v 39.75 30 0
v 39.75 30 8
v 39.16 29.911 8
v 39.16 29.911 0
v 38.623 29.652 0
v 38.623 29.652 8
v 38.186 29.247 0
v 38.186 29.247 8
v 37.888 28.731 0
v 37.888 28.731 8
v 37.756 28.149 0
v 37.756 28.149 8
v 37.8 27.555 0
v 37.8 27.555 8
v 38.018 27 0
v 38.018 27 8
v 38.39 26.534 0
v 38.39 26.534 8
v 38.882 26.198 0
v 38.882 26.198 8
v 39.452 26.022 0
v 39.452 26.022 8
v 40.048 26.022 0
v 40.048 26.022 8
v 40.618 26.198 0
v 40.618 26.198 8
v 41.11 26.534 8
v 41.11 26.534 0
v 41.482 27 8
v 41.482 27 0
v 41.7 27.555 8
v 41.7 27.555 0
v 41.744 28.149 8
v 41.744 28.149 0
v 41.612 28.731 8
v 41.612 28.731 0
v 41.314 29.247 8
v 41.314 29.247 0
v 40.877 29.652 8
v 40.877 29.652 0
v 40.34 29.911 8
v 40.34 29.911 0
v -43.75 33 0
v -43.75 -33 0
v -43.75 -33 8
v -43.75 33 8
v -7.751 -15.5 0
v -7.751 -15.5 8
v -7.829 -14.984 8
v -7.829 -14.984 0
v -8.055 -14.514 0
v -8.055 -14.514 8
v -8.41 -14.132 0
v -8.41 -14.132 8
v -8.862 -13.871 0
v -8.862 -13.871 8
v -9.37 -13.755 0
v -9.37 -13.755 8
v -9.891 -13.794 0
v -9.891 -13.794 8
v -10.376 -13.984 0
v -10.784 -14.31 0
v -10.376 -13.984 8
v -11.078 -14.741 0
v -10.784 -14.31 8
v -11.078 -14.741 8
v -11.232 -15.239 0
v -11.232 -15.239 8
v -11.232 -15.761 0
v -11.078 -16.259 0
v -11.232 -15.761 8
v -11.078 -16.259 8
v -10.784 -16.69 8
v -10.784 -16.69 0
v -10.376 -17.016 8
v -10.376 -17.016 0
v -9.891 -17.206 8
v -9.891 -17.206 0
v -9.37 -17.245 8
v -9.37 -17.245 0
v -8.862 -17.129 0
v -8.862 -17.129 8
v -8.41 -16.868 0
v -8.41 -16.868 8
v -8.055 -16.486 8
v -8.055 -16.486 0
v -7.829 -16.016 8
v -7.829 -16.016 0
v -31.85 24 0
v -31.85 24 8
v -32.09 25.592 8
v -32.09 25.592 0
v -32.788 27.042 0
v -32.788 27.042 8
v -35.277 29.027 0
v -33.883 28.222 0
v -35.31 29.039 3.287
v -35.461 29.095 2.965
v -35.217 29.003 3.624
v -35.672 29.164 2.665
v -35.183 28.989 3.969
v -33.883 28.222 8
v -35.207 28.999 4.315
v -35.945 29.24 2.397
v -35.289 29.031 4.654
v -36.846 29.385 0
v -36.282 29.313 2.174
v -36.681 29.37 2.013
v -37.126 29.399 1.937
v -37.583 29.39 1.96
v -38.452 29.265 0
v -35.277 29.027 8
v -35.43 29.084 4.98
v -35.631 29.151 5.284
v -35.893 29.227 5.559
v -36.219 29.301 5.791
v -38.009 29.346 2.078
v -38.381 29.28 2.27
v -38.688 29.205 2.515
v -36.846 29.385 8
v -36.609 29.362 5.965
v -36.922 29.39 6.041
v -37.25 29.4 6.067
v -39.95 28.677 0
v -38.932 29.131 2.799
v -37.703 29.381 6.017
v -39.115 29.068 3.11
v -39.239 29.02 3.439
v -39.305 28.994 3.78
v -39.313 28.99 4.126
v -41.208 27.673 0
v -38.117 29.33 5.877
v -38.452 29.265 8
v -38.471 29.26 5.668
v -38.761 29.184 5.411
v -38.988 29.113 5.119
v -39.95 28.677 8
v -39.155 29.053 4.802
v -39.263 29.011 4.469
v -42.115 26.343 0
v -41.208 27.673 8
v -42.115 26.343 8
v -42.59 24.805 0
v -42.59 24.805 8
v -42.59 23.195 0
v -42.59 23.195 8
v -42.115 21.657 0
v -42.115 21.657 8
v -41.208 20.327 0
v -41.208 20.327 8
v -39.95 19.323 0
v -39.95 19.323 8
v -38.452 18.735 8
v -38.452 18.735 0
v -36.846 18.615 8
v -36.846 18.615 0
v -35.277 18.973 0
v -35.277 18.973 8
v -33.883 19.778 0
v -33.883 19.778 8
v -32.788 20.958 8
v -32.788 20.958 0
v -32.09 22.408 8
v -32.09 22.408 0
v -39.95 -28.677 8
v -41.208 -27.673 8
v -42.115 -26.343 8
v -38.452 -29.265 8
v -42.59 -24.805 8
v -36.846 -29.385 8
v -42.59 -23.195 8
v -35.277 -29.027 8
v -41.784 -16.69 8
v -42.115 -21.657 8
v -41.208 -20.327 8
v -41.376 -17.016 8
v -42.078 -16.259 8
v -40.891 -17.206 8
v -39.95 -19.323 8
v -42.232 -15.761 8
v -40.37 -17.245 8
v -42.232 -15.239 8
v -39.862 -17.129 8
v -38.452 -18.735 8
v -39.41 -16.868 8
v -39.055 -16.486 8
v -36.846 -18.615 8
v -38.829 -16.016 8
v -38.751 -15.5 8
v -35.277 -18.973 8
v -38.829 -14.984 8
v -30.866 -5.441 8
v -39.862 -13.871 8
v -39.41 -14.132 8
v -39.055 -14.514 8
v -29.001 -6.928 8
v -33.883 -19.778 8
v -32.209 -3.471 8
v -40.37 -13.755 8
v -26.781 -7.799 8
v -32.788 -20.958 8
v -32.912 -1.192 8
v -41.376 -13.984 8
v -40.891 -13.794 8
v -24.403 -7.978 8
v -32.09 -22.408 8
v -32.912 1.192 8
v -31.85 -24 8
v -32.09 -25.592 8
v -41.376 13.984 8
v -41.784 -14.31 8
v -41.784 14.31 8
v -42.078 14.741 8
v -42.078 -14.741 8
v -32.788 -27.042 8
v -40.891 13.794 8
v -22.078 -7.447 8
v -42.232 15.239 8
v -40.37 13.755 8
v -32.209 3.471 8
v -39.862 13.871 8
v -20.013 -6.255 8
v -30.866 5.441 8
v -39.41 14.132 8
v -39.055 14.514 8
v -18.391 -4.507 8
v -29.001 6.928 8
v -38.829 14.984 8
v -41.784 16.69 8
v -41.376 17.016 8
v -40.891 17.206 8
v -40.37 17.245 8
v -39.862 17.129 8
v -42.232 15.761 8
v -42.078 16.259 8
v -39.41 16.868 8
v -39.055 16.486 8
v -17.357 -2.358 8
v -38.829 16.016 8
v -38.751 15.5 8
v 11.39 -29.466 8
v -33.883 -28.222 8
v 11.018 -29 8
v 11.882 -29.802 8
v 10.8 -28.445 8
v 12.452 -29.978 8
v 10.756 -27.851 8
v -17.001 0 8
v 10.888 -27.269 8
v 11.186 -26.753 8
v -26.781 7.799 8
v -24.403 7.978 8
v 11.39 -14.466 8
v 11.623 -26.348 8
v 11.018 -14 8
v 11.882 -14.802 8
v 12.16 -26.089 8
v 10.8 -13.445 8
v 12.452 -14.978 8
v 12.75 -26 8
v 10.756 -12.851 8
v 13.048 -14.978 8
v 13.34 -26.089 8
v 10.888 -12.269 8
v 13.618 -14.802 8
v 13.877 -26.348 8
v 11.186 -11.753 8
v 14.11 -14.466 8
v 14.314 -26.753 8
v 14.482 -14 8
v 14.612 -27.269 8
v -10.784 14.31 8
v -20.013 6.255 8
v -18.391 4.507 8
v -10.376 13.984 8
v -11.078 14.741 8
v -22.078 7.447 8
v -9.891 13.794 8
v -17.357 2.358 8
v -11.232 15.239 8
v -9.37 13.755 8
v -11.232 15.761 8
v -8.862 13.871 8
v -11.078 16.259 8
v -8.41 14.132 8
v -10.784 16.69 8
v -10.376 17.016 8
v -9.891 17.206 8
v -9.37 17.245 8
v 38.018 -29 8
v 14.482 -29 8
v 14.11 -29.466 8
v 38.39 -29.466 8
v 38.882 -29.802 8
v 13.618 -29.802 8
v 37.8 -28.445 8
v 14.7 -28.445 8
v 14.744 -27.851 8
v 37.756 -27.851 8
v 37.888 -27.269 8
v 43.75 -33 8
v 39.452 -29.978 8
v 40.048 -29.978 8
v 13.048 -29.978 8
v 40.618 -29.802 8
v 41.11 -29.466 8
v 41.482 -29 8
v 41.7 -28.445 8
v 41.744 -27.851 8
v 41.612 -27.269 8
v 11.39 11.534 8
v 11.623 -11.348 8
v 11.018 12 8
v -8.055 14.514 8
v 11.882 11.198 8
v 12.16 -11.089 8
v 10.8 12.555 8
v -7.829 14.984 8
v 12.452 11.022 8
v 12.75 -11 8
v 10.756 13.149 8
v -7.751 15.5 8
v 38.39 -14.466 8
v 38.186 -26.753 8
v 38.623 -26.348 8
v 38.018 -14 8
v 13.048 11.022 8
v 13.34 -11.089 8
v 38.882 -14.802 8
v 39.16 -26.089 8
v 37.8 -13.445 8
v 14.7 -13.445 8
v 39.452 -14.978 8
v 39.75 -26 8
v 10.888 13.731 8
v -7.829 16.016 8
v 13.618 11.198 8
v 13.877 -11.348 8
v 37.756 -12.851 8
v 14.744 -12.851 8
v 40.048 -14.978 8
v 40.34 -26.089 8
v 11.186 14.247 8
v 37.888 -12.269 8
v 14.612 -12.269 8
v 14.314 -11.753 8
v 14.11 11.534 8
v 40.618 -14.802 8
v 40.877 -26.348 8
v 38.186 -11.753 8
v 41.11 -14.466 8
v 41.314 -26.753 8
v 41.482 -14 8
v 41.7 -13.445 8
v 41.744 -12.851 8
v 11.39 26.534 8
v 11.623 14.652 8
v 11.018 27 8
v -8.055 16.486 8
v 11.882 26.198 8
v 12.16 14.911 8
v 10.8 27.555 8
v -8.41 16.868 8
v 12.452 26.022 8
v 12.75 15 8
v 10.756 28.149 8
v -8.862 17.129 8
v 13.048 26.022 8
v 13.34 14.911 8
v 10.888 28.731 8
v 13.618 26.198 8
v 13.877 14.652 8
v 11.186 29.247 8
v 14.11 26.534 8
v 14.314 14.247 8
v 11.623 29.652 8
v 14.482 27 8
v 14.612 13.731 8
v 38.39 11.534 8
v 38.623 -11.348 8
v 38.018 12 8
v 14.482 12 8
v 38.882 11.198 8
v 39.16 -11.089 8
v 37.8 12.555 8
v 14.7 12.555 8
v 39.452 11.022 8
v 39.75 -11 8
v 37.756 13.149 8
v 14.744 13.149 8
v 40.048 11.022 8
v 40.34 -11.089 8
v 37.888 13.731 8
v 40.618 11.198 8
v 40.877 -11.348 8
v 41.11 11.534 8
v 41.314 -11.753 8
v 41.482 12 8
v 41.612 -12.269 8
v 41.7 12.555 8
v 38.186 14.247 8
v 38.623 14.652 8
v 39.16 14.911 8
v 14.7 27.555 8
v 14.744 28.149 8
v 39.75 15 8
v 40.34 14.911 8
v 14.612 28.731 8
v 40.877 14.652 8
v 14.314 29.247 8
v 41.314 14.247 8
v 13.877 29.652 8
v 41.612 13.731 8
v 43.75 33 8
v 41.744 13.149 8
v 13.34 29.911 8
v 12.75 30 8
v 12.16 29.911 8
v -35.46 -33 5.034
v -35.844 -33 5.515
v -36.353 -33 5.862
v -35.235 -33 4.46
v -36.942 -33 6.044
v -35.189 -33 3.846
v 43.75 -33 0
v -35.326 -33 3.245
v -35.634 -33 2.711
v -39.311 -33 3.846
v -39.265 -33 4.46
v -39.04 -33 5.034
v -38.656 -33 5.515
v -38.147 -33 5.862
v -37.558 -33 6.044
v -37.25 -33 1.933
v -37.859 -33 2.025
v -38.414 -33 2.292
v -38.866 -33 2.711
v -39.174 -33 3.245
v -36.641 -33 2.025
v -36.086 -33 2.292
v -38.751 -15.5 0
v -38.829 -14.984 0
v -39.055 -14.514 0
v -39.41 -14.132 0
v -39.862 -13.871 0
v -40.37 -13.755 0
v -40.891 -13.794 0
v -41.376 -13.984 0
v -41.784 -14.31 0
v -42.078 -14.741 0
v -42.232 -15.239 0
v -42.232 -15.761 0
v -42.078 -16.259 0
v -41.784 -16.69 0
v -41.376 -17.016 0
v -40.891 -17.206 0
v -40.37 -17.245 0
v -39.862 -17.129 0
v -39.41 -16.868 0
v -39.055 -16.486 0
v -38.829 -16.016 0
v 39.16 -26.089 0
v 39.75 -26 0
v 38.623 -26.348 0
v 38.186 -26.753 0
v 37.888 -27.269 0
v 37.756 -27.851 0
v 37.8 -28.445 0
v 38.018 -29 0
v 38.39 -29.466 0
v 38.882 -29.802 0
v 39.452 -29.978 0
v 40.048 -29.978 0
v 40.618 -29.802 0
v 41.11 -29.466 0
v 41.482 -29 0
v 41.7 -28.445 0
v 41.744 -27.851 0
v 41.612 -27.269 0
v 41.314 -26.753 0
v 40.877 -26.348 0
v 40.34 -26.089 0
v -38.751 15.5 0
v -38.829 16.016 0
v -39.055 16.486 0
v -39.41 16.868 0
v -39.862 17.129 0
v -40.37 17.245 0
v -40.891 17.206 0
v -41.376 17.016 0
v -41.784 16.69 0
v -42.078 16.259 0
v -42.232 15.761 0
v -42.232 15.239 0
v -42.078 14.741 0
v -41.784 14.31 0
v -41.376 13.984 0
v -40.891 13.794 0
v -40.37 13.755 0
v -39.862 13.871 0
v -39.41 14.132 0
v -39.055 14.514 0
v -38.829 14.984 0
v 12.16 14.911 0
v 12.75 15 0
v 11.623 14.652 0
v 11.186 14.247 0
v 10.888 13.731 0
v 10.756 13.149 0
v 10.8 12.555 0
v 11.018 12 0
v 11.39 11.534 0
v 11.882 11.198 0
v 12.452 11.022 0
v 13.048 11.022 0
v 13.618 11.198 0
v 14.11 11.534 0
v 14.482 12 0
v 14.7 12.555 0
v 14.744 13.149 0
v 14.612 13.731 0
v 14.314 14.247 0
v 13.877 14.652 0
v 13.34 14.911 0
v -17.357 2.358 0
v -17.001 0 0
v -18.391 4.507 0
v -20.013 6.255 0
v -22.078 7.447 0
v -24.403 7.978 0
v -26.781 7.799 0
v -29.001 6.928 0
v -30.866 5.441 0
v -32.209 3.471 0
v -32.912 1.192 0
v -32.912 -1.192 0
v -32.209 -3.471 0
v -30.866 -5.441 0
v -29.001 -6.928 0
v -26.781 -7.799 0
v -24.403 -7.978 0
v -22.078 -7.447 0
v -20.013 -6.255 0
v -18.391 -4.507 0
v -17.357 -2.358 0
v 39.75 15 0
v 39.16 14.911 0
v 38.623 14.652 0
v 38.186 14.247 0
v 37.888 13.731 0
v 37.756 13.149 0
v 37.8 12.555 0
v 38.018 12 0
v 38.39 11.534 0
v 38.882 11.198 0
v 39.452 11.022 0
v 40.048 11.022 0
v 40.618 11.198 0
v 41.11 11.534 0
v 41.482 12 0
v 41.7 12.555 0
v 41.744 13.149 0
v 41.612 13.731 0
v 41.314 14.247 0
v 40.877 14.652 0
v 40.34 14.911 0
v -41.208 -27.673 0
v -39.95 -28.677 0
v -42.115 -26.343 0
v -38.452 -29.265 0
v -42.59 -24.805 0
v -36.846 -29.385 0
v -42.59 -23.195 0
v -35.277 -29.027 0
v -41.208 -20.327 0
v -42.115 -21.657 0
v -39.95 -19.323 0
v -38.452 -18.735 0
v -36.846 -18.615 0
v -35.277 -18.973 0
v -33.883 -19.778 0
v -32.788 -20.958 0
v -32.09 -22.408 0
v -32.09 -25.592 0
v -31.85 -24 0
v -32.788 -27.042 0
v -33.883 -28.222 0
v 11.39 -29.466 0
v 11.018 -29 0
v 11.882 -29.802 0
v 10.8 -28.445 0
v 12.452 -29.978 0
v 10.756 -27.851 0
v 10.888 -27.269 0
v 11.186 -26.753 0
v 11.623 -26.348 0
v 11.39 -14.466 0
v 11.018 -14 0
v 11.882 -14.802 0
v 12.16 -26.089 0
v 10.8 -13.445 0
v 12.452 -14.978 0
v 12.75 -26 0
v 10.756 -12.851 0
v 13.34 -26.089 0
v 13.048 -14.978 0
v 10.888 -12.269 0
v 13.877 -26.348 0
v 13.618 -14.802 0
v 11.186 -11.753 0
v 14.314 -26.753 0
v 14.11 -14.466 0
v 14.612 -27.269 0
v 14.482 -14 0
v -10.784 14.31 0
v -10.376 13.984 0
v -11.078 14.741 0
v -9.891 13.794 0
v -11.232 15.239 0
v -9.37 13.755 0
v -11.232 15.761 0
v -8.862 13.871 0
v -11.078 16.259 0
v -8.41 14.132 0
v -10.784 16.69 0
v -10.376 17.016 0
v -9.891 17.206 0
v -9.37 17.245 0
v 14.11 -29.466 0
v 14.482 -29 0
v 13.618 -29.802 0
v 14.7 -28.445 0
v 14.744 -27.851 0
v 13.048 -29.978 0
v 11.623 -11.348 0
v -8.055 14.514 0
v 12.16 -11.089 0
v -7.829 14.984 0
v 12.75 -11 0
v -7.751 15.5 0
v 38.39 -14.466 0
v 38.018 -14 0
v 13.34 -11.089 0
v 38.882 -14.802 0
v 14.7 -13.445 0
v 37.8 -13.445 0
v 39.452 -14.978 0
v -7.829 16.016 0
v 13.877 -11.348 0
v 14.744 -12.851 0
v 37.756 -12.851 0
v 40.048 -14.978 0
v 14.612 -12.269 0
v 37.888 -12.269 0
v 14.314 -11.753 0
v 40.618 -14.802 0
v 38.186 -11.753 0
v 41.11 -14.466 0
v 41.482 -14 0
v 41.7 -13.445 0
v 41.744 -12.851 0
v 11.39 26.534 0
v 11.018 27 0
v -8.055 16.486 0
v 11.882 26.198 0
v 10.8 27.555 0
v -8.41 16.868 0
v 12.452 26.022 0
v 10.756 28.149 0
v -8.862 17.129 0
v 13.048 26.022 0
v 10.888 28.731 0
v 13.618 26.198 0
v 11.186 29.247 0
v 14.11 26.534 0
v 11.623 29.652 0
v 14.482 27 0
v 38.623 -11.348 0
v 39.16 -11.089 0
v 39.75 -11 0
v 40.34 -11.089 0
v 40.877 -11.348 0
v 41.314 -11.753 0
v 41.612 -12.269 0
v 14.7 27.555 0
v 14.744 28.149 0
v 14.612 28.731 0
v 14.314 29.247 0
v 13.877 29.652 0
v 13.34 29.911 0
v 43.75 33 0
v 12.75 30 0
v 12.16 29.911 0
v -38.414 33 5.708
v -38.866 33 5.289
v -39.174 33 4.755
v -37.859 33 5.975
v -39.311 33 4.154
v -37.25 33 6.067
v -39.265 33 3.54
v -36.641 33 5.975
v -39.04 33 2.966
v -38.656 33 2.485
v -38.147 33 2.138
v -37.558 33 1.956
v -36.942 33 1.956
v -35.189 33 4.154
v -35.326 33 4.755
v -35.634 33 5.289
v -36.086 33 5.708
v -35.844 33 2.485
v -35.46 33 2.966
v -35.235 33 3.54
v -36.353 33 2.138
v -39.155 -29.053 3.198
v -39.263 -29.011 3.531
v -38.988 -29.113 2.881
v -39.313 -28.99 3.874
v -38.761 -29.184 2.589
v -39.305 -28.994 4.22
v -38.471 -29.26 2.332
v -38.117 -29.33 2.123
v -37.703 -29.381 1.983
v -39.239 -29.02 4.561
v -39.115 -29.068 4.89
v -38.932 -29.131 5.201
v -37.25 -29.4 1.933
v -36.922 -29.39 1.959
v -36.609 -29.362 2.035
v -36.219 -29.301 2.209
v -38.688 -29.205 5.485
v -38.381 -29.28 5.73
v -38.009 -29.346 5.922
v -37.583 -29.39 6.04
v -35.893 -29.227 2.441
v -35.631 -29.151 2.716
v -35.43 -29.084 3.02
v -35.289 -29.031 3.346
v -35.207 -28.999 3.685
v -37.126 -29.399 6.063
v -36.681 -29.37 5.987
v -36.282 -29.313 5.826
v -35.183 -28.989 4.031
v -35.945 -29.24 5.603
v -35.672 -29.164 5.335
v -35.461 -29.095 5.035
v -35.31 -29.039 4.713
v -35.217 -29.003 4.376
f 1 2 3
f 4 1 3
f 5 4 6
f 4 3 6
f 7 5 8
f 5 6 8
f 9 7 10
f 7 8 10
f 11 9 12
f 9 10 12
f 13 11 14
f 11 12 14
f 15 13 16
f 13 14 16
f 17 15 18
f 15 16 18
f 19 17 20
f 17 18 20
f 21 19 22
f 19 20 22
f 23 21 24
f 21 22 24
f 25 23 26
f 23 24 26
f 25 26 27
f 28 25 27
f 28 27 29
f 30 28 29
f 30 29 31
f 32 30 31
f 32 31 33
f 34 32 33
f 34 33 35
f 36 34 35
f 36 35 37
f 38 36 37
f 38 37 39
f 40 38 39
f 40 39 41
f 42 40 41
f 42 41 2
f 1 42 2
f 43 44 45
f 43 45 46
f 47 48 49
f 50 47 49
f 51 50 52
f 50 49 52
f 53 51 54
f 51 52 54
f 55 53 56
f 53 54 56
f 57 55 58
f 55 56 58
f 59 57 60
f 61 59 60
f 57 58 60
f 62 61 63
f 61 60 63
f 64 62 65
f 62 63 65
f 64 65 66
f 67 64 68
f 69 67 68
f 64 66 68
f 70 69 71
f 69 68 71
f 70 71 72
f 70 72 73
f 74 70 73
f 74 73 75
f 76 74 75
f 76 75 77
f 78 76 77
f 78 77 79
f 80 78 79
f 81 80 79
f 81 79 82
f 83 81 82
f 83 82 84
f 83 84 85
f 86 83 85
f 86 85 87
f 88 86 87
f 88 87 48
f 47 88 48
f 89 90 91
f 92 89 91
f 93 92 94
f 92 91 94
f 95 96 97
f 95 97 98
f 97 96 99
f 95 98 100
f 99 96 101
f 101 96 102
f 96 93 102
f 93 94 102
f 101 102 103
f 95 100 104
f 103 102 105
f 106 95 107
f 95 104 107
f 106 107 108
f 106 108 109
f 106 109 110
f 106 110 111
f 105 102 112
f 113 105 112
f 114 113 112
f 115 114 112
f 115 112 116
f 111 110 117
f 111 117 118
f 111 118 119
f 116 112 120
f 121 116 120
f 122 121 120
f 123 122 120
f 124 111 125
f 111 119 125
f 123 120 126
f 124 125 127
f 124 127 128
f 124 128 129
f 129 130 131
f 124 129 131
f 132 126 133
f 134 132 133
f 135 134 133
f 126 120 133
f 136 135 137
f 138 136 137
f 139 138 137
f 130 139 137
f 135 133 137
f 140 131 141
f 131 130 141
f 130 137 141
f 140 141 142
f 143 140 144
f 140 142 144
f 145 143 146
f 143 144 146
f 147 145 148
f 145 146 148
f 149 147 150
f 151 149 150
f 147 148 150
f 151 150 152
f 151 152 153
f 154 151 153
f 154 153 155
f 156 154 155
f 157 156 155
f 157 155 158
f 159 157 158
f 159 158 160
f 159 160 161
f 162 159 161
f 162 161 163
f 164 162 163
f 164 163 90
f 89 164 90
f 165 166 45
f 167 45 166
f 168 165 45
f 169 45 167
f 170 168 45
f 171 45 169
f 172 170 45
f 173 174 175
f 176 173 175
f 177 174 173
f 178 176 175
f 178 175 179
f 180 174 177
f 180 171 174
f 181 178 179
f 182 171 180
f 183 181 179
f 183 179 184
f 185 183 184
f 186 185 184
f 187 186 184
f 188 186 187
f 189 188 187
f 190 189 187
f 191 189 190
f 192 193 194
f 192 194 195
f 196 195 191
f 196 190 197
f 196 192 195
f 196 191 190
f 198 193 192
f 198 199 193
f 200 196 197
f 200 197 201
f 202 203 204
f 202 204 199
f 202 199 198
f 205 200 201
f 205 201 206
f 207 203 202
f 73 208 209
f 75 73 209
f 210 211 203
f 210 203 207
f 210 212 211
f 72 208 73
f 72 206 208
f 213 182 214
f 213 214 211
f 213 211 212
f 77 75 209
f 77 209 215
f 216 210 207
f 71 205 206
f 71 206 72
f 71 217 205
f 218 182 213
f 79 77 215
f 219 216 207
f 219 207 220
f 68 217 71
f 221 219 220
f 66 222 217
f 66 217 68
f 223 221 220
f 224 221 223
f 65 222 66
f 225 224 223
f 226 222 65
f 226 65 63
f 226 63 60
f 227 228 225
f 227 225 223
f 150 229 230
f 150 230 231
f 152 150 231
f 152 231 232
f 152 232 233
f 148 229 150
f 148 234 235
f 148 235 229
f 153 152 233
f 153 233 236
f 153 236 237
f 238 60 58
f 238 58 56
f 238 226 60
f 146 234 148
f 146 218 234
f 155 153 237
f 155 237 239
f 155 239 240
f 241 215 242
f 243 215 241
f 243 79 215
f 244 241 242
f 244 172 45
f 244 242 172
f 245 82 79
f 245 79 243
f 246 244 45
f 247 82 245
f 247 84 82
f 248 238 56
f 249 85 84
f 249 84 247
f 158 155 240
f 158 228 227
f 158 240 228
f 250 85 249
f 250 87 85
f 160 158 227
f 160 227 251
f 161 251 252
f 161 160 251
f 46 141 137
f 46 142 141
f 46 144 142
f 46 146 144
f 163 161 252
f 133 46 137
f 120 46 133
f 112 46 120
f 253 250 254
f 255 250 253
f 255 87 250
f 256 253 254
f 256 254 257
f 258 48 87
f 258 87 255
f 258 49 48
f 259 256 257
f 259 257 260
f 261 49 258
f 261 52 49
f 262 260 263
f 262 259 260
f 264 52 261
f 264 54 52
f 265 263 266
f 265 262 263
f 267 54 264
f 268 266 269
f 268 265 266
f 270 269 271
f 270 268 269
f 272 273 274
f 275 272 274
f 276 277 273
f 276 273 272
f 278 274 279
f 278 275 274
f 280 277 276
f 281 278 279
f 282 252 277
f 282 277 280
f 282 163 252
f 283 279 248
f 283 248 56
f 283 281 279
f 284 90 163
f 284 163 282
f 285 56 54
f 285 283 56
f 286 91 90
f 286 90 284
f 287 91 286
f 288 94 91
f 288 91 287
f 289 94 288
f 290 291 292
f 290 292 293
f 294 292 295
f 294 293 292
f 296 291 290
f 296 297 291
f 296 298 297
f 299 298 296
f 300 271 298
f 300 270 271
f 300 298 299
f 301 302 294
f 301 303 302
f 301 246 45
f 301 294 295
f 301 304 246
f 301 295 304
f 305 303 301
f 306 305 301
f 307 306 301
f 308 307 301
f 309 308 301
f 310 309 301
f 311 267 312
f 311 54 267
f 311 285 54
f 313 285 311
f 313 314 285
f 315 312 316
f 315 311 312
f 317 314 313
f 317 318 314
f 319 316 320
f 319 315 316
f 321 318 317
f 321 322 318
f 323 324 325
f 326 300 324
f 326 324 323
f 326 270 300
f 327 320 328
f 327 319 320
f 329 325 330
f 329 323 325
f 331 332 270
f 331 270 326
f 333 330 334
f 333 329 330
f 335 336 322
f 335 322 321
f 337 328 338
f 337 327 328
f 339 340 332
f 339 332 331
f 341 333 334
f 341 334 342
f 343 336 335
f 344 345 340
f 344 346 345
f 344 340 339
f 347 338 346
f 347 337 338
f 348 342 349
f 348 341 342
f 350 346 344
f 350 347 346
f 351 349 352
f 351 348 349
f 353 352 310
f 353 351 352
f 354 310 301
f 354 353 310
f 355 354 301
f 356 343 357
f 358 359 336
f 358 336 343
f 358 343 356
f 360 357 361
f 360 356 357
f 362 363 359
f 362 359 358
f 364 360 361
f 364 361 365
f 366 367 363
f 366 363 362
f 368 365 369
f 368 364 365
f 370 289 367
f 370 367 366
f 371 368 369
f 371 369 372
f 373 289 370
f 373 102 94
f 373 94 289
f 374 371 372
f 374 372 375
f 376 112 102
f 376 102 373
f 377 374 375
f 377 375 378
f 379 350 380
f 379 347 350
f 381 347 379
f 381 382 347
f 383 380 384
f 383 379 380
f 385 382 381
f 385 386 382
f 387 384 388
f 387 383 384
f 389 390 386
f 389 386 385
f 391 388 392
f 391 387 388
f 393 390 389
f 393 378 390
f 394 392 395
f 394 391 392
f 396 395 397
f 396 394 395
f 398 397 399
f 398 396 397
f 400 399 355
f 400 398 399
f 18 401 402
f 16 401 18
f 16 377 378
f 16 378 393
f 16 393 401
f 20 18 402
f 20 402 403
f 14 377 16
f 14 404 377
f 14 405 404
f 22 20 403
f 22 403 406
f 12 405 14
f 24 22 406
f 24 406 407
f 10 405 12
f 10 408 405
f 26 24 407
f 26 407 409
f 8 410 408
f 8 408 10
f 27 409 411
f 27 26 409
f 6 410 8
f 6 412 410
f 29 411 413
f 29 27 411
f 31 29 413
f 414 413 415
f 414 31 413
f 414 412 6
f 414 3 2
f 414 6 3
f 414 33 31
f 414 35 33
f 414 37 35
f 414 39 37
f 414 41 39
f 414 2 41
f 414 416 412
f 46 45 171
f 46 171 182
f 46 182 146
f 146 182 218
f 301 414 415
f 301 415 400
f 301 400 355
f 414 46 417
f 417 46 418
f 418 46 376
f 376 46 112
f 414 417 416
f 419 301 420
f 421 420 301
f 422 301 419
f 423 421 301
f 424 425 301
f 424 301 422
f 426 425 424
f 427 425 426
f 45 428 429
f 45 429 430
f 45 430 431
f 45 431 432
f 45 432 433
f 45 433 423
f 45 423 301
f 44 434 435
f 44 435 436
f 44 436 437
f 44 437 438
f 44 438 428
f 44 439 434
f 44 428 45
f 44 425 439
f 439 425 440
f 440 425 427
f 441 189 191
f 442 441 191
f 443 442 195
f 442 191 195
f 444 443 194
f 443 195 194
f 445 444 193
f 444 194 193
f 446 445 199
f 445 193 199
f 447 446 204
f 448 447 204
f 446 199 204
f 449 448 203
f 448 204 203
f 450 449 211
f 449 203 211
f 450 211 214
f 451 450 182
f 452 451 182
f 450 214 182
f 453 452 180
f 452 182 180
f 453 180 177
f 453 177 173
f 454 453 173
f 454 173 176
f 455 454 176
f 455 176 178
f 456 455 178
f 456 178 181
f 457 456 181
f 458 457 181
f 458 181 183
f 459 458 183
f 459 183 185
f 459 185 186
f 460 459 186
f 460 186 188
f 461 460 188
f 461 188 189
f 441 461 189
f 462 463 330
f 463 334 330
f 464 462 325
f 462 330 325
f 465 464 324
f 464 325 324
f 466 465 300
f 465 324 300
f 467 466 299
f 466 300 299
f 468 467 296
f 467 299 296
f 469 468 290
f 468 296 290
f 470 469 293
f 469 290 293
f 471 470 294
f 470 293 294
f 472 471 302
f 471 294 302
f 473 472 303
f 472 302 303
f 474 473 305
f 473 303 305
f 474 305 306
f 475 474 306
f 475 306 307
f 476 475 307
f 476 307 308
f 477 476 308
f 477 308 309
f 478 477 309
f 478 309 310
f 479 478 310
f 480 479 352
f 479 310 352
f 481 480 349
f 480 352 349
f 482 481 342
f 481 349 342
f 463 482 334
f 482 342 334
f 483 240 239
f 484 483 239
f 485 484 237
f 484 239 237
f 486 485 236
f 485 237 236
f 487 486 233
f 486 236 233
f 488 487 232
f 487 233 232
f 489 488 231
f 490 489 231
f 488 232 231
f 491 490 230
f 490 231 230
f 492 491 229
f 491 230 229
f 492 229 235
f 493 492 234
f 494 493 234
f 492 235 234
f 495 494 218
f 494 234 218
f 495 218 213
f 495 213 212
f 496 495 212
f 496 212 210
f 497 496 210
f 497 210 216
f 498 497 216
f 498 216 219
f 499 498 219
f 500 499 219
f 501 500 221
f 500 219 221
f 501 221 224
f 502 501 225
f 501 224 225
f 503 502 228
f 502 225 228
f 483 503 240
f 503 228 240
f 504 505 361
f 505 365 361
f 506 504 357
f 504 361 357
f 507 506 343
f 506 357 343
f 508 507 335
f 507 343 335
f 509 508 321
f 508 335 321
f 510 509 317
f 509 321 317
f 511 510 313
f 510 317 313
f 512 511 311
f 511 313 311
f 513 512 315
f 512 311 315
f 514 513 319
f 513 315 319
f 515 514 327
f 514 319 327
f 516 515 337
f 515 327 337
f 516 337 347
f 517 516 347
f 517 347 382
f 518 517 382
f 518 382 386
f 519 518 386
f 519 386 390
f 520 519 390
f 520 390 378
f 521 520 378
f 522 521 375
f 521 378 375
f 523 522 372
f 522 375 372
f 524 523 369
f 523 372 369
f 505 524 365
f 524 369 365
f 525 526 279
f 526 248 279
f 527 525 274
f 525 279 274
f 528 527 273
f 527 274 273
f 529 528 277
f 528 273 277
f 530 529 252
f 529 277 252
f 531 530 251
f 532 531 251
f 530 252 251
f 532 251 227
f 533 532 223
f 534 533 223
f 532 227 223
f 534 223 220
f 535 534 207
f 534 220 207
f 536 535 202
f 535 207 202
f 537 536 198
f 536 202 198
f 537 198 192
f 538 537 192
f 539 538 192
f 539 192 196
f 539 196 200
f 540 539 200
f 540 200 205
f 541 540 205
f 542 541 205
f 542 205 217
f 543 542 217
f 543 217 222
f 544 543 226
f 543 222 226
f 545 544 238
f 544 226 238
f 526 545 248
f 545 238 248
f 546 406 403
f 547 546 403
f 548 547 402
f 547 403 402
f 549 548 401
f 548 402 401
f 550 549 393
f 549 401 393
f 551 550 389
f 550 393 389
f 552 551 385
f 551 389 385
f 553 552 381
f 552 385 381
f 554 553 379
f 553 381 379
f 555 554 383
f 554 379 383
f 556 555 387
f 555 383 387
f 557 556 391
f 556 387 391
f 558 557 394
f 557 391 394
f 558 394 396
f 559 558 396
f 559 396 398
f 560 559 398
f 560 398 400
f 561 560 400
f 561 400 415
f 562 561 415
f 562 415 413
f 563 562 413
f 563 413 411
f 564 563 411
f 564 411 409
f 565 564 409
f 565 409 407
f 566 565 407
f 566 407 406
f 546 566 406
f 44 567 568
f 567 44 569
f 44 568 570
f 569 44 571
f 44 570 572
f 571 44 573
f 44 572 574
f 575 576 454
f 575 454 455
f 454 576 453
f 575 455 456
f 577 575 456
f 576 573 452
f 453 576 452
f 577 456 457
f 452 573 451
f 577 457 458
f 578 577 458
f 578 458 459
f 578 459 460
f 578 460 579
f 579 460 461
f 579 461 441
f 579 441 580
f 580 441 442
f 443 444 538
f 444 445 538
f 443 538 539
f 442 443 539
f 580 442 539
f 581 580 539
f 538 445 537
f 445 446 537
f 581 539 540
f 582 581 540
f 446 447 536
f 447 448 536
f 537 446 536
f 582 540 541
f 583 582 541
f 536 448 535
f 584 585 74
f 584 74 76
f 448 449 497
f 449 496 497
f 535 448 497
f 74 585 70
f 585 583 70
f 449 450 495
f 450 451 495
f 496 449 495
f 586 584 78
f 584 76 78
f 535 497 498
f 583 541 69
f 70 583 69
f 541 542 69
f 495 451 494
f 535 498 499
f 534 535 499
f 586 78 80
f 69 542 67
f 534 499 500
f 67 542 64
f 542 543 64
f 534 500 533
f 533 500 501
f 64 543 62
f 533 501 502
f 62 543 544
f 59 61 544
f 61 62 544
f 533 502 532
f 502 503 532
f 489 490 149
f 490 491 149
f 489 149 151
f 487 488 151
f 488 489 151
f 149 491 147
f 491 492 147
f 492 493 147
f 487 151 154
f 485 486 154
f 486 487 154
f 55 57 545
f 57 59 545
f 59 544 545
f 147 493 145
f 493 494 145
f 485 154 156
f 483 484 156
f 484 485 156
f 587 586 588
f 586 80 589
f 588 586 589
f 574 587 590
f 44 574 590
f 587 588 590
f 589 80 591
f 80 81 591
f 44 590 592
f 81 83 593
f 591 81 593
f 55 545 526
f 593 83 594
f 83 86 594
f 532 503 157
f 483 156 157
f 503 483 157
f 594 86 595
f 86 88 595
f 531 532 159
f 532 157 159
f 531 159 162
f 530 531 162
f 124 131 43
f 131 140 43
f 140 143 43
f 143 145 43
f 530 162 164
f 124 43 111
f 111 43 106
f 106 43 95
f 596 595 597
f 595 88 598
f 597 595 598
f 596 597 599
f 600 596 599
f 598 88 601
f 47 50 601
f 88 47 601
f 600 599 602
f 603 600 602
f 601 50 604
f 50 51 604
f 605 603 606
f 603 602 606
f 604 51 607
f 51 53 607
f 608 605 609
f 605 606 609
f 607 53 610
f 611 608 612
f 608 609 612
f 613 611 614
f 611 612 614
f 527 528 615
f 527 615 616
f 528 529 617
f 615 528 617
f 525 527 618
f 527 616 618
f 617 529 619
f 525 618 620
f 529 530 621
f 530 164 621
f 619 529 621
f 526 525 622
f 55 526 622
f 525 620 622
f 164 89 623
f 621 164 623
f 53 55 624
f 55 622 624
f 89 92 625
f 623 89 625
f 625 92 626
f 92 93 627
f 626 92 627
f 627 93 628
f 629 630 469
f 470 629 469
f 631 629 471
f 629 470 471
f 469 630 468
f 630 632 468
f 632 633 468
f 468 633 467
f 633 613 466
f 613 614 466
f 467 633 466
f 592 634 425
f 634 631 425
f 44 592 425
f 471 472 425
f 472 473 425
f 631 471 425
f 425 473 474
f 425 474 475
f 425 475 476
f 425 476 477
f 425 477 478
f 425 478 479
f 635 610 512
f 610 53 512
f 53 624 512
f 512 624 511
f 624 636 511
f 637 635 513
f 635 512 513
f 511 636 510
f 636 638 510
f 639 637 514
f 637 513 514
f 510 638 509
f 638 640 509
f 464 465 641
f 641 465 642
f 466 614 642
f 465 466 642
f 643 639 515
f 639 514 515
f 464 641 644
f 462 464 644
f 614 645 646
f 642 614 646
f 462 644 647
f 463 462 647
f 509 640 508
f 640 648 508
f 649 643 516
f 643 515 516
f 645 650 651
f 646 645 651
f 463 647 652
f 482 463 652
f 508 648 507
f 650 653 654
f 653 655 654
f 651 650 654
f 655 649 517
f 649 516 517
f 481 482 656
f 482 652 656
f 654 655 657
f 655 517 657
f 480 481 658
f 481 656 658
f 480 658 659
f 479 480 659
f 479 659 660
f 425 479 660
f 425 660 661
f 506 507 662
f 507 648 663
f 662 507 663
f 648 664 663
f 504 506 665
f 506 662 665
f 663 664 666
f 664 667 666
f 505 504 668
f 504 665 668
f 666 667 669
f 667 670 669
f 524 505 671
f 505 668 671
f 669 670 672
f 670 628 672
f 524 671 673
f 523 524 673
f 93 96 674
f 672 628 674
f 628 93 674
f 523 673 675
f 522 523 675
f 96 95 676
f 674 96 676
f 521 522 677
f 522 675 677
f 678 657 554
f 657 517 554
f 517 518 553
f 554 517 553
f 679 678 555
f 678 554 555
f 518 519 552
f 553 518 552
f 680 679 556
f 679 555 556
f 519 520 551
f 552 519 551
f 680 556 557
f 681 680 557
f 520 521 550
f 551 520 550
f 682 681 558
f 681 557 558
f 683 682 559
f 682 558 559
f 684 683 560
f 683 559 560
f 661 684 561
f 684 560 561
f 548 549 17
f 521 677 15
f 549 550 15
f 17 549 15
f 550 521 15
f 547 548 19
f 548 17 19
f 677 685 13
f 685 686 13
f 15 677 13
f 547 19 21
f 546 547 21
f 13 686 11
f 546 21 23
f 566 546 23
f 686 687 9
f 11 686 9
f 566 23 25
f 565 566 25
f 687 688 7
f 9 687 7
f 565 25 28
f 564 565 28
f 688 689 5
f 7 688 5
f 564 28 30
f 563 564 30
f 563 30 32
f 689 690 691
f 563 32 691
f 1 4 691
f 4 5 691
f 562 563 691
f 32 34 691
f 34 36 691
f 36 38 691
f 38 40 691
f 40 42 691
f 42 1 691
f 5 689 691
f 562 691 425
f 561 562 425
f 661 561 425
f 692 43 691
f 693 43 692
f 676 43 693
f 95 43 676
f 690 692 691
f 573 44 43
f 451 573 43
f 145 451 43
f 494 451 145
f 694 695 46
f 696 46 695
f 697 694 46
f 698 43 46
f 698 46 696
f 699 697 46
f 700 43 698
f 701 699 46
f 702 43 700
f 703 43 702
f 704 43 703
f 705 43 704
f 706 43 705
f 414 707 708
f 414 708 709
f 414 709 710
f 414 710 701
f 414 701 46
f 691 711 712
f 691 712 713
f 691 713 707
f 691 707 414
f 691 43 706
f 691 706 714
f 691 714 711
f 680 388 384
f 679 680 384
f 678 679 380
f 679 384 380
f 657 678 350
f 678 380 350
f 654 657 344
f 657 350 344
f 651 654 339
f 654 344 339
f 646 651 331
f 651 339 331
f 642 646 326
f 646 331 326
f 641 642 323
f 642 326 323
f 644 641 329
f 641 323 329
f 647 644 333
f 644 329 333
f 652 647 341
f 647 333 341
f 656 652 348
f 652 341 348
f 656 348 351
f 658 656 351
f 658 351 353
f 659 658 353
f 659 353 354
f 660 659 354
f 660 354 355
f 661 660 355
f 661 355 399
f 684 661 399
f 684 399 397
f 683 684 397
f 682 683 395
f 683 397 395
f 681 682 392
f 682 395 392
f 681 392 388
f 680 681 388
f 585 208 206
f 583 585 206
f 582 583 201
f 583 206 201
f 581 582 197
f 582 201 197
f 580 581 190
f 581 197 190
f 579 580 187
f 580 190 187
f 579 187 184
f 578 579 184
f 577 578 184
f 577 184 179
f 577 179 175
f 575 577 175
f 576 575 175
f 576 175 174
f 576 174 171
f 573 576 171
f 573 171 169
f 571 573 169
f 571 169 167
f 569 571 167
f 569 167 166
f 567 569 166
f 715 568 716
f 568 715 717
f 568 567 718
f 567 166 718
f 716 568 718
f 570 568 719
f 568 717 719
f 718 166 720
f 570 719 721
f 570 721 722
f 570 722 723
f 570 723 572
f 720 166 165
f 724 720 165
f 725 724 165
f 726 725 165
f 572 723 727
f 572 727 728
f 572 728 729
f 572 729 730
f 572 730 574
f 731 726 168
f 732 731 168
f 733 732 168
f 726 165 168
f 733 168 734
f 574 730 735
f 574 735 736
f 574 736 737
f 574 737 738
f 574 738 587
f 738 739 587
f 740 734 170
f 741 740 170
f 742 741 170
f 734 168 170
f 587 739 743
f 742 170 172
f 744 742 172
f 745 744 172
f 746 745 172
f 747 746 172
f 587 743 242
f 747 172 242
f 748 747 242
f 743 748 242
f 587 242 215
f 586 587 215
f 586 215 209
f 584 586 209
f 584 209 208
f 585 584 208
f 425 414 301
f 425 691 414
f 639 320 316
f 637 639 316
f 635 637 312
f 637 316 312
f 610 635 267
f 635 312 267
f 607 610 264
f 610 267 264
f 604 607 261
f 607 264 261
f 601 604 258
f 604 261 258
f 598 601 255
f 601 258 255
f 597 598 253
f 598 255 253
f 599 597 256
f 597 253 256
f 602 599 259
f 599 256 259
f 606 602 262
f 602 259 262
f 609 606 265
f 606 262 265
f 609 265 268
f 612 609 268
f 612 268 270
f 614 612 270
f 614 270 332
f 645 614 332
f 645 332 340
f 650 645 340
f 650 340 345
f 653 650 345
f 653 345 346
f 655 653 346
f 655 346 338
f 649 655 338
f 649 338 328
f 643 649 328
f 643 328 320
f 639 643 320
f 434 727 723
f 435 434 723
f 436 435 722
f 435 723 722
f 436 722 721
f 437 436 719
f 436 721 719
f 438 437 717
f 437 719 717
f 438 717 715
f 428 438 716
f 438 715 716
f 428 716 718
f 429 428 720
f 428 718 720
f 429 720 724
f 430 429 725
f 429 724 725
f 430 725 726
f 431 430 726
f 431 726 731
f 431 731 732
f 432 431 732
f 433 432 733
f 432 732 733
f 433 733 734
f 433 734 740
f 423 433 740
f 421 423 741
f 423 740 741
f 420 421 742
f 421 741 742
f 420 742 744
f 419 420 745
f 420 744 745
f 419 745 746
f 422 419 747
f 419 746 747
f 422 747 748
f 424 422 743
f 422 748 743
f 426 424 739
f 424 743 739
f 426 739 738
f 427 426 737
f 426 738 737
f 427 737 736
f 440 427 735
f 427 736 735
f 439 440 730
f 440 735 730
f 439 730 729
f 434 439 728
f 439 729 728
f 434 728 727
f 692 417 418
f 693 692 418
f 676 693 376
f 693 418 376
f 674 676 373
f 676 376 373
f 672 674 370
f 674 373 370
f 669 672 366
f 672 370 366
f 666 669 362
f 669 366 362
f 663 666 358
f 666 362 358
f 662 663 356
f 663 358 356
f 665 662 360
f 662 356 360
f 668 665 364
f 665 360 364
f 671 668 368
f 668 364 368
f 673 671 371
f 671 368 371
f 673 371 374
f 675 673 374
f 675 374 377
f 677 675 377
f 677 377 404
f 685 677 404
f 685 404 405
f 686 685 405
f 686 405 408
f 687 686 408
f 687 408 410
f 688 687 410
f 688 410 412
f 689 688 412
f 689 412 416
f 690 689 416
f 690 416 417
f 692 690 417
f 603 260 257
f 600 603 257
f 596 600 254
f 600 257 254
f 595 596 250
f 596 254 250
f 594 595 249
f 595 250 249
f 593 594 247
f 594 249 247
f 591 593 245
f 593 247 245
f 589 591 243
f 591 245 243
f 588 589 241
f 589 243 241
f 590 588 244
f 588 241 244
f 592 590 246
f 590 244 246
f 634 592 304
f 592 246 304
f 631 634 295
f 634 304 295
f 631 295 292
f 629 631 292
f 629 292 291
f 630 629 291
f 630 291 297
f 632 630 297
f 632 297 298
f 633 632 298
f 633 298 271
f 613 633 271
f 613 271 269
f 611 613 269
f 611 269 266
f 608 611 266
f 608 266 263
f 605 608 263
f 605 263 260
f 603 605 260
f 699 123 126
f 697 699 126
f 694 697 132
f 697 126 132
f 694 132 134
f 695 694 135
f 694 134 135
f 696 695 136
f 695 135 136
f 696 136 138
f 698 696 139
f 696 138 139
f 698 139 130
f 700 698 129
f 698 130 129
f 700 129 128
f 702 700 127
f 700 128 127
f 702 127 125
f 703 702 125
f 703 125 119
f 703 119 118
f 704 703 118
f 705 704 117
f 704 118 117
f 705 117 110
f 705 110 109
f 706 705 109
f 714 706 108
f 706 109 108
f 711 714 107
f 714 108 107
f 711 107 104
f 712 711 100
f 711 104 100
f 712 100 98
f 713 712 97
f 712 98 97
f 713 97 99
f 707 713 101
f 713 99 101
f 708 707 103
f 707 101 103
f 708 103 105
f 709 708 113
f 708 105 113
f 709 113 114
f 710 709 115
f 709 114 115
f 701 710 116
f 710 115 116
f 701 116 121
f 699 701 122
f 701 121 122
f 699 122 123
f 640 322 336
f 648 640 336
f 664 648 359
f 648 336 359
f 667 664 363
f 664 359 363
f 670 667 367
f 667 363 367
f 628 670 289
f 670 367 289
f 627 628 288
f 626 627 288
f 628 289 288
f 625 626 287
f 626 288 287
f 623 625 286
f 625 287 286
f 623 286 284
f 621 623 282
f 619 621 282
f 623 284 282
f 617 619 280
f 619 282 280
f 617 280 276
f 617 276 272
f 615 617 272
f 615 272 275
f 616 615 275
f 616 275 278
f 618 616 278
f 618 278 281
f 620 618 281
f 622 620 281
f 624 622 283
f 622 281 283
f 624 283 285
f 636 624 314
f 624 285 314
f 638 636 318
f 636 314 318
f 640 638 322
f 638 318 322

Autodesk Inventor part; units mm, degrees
ref_plane "YZ Plane" through (0, 0, 0) normal (1, 0, 0) x (0, 1, 0)
ref_plane "XZ Plane" through (0, 0, 0) normal (0, 1, 0) x (-1, 0, 0)
ref_plane "XY Plane" through (0, 0, 0) normal (0, 0, 1) x (1, 0, 0)
sketch "Sketch1" plane through (0, 0, 0) normal (0, 0, 1) x (1, 0, 0)
  line L0 (-43.75, 33) -> (43.75, 33)
  line L1 (43.75, 33) -> (43.75, -33)
  line L2 (43.75, -33) -> (-43.75, -33)
  line L3 (-43.75, -33) -> (-43.75, 33)
  point P0 (0, 0)
  point P1 (0, 33)
  point P2 (-43.75, 0)
  dimension "d0" = 87.5
  dimension "d1" = 66
extrude "Extrusion1" add sketch "Sketch1" along normal blind 8
sketch "Sketch4" plane through (0, 0, 8) normal (0, 0, 1) x (1, 0, 0)
  line L0 (43.75, 33) -> (-43.75, 33) projected
  line L1 (-43.75, 33) -> (-43.75, -33) projected
  circle A0 centre (-37.25, 24) radius 5.4
  circle A1 centre (-37.25, -24) radius 5.4
  line L2 (-43.75, -33) -> (43.75, -33) projected
  point P0 (0, 0)
  dimension "d27" = 6.5
  dimension "d28" = 9
  dimension "d29" = 10.8
  dimension "d30" = 9
extrude "Extrusion4" cut sketch "Sketch4" against normal through all
sketch "Sketch5" plane through (0, 0, 8) normal (0, 0, 1) x (1, 0, 0)
  circle A0 centre (-25.0012, 0) radius 4
  circle A1 centre (-25.0012, 0) radius 8
  line L0 (-43.75, 33) -> (-43.75, -33) projected
  line L1 (43.75, 33) -> (-43.75, 33) projected
  circle A2 centre (-25.0012, 0) radius 4 projected
  circle A3 centre (-25.0012, 0) radius 7 projected
  point P0 (0, 0)
  point P1 (-43.75, 0)
  dimension "d24" = 16
  dimension "d33" = 18.7488
extrude "Extrusion5" cut sketch "Sketch5" against normal through all contours A0 | A1 | A3
sketch "Sketch6" plane through (0, 0, 8) normal (0, 0, 1) x (1, 0, 0)
  circle A0 centre (-40.5012, 15.5) radius 1.75
  circle A1 centre (-9.5012, 15.5) radius 1.75
  circle A2 centre (-9.5012, -15.5) radius 1.75
  circle A3 centre (-40.5012, -15.5) radius 1.75
  line L0 (-40.5012, 15.5) -> (-9.5012, 15.5)
  line L1 (-9.5012, 15.5) -> (-9.5012, -15.5)
  line L2 (-9.5012, -15.5) -> (-40.5012, -15.5)
  line L3 (-40.5012, -15.5) -> (-40.5012, 15.5)
  line L4 (-40.5012, 15.5) -> (-9.5012, -15.5) construction
  line L5 (-9.5012, 15.5) -> (-40.5012, -15.5) construction
  circle A4 centre (-25.0012, 0) radius 8 projected
  line L6 (-43.75, 33) -> (-43.75, -33) projected
  line L7 (43.75, 33) -> (-43.75, 33) projected
  circle A5 centre (-40.5012, -15.5) radius 2.75 projected
  circle A6 centre (-9.5012, 15.5) radius 3 projected
  point P0 (0, 0)
  point P1 (-25.0012, 0)
  dimension "d35" = 3.5
  dimension "d36" = 31
extrude "Extrusion6" cut sketch "Sketch6" against normal through all contours L0 L3 A0 | A0 L3 L0 | L0 L1 A1 | A1 L1 L0 | L3 L2 A3 | A3 L2 L3 | L1 L2 A2 | A2 L2 L1
sketch "Sketch8" plane through (0, 0, 0) normal (0, 0, -1) x (-1, 0, 0)
  line L0 (-43.75, 33) -> (43.75, 33) projected
  line L1 (-43.75, -33) -> (-43.75, 33) projected
  point P0 (0, 0)
  point P1 (-39.75, 28)
  point P2 (-39.75, 13)
  point P3 (-39.75, -13)
  point P4 (-39.75, -28)
  dimension "d38" = 5
  dimension "d39" = 15
  dimension "d40" = 26
  dimension "d41" = 15
  dimension "d42" = 4
hole "Hole1" at (39.75, 28, 0) direction (0, 0, 1) diameter 4 end through all
pattern_linear "Rectangular Pattern1" count 2 spacing 15 along (0, -1, 0) count 2 spacing 41 along (0, -1, 0) of "Hole1"
pattern_linear "Rectangular Pattern2" count 2 spacing 27 along (-1, 0, 0) of "Hole1", "Rectangular Pattern1"
sketch "Sketch9" plane through (-43.75, -33, 0) normal (0, -1, 0) x (1, 0, 0)
  line L0 (0, 0) -> (0, 8) projected
  point P0 (43.75, 0)
  point P1 (6.5, 4)
  point P2 (0, 4)
  dimension "d59" = 6.5
hole "Hole2" at (-37.25, -33, 4) direction (0, 1, 0) diameter 4.134 depth 7.45 tip angle 118 thread size "M5x0.8" class "6H" standard "ISO Metric profile"
sketch "Sketch10" plane through (-43.75, 33, 0) normal (0, 1, 0) x (1, 0, 0)
  circle A0 centre (6.5, -4) radius 2.067 projected
  point P0 (43.75, 0)
hole "Hole3" at (-37.25, 33, 4) direction (0, -1, 0) diameter 4.134 depth 7.45 tip angle 118 thread size "M5x0.8" class "6H" standard "ISO Metric profile"
equation "\"d30\" = d28"
properties part number "0005-10-027 suport nema Z" material "Wood (Maple)"
